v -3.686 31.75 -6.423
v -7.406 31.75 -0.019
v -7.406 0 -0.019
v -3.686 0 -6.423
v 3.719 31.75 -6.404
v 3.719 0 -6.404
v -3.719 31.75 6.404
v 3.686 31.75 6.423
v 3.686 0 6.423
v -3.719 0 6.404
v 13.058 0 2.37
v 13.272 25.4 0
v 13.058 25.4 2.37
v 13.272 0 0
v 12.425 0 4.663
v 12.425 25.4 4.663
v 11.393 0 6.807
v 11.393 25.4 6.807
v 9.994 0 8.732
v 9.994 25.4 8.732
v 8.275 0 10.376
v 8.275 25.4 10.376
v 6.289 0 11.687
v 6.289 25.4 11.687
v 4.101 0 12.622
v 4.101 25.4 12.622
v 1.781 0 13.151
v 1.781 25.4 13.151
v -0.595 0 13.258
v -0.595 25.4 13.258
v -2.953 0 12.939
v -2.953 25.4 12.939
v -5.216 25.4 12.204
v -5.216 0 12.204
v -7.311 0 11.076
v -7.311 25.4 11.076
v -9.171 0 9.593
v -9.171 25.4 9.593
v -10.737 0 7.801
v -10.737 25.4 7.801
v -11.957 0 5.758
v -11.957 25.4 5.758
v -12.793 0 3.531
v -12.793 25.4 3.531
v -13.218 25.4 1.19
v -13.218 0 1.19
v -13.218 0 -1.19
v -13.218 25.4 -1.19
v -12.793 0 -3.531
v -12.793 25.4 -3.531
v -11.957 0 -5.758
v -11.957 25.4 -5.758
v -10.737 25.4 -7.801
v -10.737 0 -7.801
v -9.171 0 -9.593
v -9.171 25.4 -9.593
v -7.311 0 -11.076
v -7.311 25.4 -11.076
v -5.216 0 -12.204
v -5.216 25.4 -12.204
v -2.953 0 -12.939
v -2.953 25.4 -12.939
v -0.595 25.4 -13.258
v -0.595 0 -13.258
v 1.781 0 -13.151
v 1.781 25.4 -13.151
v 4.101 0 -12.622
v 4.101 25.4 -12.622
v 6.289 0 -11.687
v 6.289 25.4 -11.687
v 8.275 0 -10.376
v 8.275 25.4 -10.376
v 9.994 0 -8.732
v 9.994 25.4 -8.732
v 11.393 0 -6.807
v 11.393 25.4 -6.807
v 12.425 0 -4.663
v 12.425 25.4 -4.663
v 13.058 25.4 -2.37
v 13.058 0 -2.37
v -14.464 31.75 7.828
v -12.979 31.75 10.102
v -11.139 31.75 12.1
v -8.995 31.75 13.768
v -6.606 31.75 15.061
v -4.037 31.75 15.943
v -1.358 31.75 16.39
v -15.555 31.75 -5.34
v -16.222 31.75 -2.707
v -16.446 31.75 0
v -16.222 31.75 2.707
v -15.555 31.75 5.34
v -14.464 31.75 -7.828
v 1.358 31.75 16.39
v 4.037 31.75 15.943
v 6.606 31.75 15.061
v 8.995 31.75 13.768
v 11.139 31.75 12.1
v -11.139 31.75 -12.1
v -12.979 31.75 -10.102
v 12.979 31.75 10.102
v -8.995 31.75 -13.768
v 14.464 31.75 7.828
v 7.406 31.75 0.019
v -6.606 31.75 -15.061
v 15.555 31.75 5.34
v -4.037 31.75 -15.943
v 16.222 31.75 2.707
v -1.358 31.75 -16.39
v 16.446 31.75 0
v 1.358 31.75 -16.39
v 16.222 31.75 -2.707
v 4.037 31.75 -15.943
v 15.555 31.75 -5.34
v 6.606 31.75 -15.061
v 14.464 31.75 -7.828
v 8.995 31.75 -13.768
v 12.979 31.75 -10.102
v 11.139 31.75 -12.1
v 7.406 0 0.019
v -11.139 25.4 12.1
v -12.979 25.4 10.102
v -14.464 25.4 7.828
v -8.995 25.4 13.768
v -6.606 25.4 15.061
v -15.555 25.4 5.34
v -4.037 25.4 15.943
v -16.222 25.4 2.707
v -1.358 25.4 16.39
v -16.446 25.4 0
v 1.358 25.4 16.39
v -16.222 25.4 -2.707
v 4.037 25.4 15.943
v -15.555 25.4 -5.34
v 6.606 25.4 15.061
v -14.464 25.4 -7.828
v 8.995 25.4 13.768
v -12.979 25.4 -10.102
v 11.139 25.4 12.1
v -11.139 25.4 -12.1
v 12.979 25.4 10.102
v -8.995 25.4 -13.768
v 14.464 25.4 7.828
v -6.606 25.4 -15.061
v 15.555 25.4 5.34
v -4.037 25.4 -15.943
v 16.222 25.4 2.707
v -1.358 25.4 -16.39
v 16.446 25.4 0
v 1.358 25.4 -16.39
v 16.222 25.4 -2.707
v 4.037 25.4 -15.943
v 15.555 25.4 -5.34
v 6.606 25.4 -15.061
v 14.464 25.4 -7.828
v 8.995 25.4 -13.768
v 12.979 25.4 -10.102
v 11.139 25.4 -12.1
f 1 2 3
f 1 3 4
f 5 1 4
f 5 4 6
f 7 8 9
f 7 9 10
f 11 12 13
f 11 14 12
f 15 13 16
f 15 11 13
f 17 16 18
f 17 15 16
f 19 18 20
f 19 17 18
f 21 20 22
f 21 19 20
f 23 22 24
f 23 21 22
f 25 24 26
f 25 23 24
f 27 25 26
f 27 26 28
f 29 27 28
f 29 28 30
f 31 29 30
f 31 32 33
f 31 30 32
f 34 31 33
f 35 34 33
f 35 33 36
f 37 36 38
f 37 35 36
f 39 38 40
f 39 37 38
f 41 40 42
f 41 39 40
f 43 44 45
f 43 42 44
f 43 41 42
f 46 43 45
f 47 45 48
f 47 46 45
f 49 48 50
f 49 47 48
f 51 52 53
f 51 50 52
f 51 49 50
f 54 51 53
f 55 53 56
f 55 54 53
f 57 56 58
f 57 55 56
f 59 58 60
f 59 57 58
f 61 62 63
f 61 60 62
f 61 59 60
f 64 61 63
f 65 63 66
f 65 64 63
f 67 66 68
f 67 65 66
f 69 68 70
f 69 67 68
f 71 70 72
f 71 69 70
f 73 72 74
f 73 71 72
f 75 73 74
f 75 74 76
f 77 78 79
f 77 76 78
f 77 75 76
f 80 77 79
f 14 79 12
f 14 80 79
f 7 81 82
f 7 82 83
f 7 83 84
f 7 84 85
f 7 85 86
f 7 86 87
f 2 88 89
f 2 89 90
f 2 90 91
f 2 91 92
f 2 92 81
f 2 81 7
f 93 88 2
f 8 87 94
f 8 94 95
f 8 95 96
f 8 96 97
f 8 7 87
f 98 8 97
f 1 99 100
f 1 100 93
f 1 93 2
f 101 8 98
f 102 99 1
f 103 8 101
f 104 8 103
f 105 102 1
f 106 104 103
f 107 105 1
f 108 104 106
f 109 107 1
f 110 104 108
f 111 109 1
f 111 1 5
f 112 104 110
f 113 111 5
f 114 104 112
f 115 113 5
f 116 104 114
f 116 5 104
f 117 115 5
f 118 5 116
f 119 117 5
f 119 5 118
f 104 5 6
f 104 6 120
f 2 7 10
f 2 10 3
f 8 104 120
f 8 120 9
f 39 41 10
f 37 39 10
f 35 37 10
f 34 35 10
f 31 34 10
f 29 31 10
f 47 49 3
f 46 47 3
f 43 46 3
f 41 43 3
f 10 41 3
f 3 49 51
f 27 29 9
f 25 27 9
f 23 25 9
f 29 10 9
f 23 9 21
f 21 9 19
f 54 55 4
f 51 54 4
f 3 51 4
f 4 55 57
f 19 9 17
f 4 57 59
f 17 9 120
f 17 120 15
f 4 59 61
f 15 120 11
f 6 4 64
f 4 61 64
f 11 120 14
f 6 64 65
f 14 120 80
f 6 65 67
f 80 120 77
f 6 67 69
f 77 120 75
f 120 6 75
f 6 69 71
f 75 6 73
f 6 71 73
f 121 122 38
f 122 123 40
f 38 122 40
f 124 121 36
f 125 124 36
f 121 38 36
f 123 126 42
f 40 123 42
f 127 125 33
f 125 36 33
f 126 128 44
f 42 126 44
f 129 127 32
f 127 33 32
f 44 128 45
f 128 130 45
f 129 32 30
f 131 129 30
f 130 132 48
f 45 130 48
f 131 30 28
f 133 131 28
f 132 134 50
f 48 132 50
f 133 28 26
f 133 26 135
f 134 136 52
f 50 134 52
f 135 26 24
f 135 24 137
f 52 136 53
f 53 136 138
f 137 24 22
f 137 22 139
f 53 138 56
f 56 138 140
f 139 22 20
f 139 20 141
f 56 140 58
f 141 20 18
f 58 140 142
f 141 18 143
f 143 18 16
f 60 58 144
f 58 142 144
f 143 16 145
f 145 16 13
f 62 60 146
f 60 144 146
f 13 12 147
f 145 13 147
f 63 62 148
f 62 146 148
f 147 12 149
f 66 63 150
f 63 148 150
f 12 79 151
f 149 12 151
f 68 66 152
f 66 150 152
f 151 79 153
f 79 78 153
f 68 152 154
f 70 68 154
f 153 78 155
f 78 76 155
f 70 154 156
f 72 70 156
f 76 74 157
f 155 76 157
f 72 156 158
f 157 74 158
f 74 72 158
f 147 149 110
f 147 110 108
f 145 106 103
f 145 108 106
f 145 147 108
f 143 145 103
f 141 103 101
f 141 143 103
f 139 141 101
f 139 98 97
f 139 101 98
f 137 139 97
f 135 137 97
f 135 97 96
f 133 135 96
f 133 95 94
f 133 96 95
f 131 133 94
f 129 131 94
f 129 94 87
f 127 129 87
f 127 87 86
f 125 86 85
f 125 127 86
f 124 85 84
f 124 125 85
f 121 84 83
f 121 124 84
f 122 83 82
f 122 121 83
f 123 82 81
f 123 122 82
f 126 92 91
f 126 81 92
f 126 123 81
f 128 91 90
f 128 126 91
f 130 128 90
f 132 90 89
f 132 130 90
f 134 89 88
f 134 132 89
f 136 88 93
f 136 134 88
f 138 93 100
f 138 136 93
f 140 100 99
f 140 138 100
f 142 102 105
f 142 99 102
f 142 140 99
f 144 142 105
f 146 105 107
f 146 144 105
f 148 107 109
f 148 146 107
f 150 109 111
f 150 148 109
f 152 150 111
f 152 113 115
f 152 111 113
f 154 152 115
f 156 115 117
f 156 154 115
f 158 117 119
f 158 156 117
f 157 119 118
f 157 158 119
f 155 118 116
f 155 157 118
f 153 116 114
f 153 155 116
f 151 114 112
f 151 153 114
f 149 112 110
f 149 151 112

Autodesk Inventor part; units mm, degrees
ref_plane "YZ Plane" through (0, 0, 0) normal (1, 0, 0) x (0, 1, 0)
ref_plane "XZ Plane" through (0, 0, 0) normal (0, 1, 0) x (-1, 0, 0)
ref_plane "XY Plane" through (0, 0, 0) normal (0, 0, 1) x (1, 0, 0)
sketch "Sketch1" plane through (0, 0, 0) normal (0, 0, 1) x (1, 0, 0)
  line L0 (0, 0) -> (0, 31.75)
  line L1 (0, 31.75) -> (0.7288, 31.75)
  line L2 (16.4465, 31.75) -> (16.4465, 25.4)
  line L3 (16.4465, 25.4) -> (13.2715, 25.4)
  line L4 (13.2715, 25.4) -> (13.2715, 0)
  line L5 (13.2715, 0) -> (0, 0)
  line L6 (16.4465, 31.75) -> (0.7288, 31.75)
  dimension "d0" = 13.2715
  dimension "d1" = 31.75
  dimension "d2" = 25.4
  dimension "d4" = 3.175
revolve "Revolution1" add sketch "Sketch1" angle 360 about axis through (0, 0, 0) along (0, 1, 0)
sketch "Sketch2" plane through (0, 31.75, 0) normal (0, 1, 0) x (1, 0, 0)
  circle A0 centre (0, 0) radius 6.4135 construction
  line L0 (7.4056, -0.019) -> (3.6864, -6.423)
  line L1 (3.6864, -6.423) -> (-3.7193, -6.404)
  line L2 (-3.7193, -6.404) -> (-7.4056, 0.019)
  line L3 (-7.4056, 0.019) -> (-3.6864, 6.423)
  line L4 (-3.6864, 6.423) -> (3.7193, 6.404)
  line L5 (3.7193, 6.404) -> (7.4056, -0.019)
  point P0 (5.5625, 3.1925)
  dimension "d5" = 12.827
extrude "Extrusion1" cut sketch "Sketch2" against normal through all
properties part number "Climber Axel End Cap"
